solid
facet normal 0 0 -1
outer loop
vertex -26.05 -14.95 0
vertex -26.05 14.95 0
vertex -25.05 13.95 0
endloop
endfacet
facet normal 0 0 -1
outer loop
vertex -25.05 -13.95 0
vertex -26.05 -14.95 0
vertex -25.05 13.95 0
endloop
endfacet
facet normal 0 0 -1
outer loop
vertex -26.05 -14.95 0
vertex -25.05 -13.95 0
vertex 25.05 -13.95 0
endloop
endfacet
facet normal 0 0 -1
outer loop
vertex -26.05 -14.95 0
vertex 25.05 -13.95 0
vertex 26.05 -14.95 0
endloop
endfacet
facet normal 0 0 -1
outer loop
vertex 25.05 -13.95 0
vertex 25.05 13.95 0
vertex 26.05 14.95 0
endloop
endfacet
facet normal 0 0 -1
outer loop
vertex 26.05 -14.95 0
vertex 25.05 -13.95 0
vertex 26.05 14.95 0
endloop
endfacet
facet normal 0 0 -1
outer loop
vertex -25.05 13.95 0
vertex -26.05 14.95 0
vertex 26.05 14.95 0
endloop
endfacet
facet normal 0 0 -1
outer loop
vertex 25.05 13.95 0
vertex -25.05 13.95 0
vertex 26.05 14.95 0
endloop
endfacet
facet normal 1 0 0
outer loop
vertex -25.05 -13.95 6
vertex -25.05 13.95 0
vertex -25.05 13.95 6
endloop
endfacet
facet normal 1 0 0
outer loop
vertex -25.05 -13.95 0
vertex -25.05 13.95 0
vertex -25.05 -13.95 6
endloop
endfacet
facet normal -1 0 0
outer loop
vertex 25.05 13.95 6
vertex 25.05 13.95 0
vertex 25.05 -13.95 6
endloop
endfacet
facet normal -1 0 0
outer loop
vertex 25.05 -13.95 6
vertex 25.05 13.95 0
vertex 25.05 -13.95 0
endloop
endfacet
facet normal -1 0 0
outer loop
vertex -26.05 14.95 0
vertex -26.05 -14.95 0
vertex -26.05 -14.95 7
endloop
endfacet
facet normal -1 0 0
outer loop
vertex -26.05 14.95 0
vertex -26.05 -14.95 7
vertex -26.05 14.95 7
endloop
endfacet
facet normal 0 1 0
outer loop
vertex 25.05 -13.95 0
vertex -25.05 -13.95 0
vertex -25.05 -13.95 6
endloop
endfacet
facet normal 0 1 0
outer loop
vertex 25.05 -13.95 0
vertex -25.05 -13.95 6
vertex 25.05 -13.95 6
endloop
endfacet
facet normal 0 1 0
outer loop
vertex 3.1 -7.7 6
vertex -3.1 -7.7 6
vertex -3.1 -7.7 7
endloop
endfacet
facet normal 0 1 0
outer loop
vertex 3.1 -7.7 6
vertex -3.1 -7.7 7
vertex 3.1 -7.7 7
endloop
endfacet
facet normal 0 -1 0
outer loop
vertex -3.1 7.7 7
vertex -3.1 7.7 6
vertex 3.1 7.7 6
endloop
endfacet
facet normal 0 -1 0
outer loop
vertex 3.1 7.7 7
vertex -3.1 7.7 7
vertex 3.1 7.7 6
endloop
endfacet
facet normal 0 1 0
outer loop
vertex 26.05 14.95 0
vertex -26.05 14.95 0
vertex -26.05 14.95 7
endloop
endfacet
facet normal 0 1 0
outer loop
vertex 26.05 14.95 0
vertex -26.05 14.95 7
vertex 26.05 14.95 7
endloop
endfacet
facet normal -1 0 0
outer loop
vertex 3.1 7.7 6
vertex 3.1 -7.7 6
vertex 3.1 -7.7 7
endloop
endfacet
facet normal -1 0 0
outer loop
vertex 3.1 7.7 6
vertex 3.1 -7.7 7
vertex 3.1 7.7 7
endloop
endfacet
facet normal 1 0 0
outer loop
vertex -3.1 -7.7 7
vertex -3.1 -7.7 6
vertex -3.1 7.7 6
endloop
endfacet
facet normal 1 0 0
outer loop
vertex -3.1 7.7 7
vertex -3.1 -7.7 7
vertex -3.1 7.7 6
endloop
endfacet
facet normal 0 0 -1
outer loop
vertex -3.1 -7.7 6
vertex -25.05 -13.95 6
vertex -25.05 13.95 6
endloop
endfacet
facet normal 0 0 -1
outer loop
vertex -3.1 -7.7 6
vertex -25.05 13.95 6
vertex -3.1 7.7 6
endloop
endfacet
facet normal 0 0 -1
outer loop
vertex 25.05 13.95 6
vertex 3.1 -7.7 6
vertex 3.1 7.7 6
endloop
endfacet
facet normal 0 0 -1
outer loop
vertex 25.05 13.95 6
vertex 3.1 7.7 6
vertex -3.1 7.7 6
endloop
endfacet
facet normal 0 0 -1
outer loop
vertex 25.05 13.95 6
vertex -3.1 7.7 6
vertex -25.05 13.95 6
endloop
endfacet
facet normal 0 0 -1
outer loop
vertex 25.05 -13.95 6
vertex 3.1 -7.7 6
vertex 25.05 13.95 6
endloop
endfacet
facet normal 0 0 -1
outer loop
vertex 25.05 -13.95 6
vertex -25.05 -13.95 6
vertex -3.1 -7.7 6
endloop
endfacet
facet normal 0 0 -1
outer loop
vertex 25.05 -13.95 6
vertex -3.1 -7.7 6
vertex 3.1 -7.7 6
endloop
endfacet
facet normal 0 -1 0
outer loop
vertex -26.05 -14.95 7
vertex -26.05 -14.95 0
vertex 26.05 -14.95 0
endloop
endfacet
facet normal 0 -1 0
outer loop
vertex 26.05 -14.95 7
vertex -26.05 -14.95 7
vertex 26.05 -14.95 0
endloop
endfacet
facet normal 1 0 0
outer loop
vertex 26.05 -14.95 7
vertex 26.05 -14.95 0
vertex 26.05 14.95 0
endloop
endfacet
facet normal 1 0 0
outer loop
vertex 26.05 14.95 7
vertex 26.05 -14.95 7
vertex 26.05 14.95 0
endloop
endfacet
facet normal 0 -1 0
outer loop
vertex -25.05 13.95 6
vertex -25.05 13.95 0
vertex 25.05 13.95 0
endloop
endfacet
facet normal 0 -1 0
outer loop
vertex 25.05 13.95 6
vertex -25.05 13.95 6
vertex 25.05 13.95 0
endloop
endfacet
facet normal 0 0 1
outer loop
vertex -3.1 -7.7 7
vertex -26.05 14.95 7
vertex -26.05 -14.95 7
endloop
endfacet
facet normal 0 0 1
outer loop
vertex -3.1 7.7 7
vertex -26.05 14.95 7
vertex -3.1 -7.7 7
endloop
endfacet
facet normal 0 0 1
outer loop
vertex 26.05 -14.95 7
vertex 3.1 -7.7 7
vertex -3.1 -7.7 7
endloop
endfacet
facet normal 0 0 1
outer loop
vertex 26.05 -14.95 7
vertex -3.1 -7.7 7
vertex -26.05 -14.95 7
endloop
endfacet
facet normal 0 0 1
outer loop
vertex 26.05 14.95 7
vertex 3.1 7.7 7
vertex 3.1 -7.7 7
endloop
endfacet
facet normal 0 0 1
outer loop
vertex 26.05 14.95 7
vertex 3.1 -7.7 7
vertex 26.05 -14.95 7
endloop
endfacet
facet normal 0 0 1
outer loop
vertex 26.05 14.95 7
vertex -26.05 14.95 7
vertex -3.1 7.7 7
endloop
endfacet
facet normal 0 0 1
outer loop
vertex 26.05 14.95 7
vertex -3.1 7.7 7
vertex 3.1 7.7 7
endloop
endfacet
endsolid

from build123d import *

# Parameters (mm, degrees)
SKETCH_W     = 52.1
SKETCH_H     = 29.9
SKETCH_W_2   = 6.2
SKETCH_H_2   = 15.4
PAD_DEPTH    = 7
SKETCH001_W  = 50.1
SKETCH001_H  = 27.9
POCKET_DEPTH = 6


with BuildPart() as part:
    # Sketch → Pad (new body)
    with BuildSketch(Plane.XY):
        Rectangle(SKETCH_W, SKETCH_H)
        Rectangle(SKETCH_W_2, SKETCH_H_2, mode=Mode.SUBTRACT)
    extrude(amount=PAD_DEPTH)

    # Sketch001 (on Face9 of Pad) → Pocket (cut)
    with BuildSketch(Plane(origin=(0, 0, 0), x_dir=(1, 0, 0), z_dir=(0, 0, -1))):
        Rectangle(SKETCH001_W, SKETCH001_H)
    extrude(amount=-POCKET_DEPTH, mode=Mode.SUBTRACT)


solid = part.part
